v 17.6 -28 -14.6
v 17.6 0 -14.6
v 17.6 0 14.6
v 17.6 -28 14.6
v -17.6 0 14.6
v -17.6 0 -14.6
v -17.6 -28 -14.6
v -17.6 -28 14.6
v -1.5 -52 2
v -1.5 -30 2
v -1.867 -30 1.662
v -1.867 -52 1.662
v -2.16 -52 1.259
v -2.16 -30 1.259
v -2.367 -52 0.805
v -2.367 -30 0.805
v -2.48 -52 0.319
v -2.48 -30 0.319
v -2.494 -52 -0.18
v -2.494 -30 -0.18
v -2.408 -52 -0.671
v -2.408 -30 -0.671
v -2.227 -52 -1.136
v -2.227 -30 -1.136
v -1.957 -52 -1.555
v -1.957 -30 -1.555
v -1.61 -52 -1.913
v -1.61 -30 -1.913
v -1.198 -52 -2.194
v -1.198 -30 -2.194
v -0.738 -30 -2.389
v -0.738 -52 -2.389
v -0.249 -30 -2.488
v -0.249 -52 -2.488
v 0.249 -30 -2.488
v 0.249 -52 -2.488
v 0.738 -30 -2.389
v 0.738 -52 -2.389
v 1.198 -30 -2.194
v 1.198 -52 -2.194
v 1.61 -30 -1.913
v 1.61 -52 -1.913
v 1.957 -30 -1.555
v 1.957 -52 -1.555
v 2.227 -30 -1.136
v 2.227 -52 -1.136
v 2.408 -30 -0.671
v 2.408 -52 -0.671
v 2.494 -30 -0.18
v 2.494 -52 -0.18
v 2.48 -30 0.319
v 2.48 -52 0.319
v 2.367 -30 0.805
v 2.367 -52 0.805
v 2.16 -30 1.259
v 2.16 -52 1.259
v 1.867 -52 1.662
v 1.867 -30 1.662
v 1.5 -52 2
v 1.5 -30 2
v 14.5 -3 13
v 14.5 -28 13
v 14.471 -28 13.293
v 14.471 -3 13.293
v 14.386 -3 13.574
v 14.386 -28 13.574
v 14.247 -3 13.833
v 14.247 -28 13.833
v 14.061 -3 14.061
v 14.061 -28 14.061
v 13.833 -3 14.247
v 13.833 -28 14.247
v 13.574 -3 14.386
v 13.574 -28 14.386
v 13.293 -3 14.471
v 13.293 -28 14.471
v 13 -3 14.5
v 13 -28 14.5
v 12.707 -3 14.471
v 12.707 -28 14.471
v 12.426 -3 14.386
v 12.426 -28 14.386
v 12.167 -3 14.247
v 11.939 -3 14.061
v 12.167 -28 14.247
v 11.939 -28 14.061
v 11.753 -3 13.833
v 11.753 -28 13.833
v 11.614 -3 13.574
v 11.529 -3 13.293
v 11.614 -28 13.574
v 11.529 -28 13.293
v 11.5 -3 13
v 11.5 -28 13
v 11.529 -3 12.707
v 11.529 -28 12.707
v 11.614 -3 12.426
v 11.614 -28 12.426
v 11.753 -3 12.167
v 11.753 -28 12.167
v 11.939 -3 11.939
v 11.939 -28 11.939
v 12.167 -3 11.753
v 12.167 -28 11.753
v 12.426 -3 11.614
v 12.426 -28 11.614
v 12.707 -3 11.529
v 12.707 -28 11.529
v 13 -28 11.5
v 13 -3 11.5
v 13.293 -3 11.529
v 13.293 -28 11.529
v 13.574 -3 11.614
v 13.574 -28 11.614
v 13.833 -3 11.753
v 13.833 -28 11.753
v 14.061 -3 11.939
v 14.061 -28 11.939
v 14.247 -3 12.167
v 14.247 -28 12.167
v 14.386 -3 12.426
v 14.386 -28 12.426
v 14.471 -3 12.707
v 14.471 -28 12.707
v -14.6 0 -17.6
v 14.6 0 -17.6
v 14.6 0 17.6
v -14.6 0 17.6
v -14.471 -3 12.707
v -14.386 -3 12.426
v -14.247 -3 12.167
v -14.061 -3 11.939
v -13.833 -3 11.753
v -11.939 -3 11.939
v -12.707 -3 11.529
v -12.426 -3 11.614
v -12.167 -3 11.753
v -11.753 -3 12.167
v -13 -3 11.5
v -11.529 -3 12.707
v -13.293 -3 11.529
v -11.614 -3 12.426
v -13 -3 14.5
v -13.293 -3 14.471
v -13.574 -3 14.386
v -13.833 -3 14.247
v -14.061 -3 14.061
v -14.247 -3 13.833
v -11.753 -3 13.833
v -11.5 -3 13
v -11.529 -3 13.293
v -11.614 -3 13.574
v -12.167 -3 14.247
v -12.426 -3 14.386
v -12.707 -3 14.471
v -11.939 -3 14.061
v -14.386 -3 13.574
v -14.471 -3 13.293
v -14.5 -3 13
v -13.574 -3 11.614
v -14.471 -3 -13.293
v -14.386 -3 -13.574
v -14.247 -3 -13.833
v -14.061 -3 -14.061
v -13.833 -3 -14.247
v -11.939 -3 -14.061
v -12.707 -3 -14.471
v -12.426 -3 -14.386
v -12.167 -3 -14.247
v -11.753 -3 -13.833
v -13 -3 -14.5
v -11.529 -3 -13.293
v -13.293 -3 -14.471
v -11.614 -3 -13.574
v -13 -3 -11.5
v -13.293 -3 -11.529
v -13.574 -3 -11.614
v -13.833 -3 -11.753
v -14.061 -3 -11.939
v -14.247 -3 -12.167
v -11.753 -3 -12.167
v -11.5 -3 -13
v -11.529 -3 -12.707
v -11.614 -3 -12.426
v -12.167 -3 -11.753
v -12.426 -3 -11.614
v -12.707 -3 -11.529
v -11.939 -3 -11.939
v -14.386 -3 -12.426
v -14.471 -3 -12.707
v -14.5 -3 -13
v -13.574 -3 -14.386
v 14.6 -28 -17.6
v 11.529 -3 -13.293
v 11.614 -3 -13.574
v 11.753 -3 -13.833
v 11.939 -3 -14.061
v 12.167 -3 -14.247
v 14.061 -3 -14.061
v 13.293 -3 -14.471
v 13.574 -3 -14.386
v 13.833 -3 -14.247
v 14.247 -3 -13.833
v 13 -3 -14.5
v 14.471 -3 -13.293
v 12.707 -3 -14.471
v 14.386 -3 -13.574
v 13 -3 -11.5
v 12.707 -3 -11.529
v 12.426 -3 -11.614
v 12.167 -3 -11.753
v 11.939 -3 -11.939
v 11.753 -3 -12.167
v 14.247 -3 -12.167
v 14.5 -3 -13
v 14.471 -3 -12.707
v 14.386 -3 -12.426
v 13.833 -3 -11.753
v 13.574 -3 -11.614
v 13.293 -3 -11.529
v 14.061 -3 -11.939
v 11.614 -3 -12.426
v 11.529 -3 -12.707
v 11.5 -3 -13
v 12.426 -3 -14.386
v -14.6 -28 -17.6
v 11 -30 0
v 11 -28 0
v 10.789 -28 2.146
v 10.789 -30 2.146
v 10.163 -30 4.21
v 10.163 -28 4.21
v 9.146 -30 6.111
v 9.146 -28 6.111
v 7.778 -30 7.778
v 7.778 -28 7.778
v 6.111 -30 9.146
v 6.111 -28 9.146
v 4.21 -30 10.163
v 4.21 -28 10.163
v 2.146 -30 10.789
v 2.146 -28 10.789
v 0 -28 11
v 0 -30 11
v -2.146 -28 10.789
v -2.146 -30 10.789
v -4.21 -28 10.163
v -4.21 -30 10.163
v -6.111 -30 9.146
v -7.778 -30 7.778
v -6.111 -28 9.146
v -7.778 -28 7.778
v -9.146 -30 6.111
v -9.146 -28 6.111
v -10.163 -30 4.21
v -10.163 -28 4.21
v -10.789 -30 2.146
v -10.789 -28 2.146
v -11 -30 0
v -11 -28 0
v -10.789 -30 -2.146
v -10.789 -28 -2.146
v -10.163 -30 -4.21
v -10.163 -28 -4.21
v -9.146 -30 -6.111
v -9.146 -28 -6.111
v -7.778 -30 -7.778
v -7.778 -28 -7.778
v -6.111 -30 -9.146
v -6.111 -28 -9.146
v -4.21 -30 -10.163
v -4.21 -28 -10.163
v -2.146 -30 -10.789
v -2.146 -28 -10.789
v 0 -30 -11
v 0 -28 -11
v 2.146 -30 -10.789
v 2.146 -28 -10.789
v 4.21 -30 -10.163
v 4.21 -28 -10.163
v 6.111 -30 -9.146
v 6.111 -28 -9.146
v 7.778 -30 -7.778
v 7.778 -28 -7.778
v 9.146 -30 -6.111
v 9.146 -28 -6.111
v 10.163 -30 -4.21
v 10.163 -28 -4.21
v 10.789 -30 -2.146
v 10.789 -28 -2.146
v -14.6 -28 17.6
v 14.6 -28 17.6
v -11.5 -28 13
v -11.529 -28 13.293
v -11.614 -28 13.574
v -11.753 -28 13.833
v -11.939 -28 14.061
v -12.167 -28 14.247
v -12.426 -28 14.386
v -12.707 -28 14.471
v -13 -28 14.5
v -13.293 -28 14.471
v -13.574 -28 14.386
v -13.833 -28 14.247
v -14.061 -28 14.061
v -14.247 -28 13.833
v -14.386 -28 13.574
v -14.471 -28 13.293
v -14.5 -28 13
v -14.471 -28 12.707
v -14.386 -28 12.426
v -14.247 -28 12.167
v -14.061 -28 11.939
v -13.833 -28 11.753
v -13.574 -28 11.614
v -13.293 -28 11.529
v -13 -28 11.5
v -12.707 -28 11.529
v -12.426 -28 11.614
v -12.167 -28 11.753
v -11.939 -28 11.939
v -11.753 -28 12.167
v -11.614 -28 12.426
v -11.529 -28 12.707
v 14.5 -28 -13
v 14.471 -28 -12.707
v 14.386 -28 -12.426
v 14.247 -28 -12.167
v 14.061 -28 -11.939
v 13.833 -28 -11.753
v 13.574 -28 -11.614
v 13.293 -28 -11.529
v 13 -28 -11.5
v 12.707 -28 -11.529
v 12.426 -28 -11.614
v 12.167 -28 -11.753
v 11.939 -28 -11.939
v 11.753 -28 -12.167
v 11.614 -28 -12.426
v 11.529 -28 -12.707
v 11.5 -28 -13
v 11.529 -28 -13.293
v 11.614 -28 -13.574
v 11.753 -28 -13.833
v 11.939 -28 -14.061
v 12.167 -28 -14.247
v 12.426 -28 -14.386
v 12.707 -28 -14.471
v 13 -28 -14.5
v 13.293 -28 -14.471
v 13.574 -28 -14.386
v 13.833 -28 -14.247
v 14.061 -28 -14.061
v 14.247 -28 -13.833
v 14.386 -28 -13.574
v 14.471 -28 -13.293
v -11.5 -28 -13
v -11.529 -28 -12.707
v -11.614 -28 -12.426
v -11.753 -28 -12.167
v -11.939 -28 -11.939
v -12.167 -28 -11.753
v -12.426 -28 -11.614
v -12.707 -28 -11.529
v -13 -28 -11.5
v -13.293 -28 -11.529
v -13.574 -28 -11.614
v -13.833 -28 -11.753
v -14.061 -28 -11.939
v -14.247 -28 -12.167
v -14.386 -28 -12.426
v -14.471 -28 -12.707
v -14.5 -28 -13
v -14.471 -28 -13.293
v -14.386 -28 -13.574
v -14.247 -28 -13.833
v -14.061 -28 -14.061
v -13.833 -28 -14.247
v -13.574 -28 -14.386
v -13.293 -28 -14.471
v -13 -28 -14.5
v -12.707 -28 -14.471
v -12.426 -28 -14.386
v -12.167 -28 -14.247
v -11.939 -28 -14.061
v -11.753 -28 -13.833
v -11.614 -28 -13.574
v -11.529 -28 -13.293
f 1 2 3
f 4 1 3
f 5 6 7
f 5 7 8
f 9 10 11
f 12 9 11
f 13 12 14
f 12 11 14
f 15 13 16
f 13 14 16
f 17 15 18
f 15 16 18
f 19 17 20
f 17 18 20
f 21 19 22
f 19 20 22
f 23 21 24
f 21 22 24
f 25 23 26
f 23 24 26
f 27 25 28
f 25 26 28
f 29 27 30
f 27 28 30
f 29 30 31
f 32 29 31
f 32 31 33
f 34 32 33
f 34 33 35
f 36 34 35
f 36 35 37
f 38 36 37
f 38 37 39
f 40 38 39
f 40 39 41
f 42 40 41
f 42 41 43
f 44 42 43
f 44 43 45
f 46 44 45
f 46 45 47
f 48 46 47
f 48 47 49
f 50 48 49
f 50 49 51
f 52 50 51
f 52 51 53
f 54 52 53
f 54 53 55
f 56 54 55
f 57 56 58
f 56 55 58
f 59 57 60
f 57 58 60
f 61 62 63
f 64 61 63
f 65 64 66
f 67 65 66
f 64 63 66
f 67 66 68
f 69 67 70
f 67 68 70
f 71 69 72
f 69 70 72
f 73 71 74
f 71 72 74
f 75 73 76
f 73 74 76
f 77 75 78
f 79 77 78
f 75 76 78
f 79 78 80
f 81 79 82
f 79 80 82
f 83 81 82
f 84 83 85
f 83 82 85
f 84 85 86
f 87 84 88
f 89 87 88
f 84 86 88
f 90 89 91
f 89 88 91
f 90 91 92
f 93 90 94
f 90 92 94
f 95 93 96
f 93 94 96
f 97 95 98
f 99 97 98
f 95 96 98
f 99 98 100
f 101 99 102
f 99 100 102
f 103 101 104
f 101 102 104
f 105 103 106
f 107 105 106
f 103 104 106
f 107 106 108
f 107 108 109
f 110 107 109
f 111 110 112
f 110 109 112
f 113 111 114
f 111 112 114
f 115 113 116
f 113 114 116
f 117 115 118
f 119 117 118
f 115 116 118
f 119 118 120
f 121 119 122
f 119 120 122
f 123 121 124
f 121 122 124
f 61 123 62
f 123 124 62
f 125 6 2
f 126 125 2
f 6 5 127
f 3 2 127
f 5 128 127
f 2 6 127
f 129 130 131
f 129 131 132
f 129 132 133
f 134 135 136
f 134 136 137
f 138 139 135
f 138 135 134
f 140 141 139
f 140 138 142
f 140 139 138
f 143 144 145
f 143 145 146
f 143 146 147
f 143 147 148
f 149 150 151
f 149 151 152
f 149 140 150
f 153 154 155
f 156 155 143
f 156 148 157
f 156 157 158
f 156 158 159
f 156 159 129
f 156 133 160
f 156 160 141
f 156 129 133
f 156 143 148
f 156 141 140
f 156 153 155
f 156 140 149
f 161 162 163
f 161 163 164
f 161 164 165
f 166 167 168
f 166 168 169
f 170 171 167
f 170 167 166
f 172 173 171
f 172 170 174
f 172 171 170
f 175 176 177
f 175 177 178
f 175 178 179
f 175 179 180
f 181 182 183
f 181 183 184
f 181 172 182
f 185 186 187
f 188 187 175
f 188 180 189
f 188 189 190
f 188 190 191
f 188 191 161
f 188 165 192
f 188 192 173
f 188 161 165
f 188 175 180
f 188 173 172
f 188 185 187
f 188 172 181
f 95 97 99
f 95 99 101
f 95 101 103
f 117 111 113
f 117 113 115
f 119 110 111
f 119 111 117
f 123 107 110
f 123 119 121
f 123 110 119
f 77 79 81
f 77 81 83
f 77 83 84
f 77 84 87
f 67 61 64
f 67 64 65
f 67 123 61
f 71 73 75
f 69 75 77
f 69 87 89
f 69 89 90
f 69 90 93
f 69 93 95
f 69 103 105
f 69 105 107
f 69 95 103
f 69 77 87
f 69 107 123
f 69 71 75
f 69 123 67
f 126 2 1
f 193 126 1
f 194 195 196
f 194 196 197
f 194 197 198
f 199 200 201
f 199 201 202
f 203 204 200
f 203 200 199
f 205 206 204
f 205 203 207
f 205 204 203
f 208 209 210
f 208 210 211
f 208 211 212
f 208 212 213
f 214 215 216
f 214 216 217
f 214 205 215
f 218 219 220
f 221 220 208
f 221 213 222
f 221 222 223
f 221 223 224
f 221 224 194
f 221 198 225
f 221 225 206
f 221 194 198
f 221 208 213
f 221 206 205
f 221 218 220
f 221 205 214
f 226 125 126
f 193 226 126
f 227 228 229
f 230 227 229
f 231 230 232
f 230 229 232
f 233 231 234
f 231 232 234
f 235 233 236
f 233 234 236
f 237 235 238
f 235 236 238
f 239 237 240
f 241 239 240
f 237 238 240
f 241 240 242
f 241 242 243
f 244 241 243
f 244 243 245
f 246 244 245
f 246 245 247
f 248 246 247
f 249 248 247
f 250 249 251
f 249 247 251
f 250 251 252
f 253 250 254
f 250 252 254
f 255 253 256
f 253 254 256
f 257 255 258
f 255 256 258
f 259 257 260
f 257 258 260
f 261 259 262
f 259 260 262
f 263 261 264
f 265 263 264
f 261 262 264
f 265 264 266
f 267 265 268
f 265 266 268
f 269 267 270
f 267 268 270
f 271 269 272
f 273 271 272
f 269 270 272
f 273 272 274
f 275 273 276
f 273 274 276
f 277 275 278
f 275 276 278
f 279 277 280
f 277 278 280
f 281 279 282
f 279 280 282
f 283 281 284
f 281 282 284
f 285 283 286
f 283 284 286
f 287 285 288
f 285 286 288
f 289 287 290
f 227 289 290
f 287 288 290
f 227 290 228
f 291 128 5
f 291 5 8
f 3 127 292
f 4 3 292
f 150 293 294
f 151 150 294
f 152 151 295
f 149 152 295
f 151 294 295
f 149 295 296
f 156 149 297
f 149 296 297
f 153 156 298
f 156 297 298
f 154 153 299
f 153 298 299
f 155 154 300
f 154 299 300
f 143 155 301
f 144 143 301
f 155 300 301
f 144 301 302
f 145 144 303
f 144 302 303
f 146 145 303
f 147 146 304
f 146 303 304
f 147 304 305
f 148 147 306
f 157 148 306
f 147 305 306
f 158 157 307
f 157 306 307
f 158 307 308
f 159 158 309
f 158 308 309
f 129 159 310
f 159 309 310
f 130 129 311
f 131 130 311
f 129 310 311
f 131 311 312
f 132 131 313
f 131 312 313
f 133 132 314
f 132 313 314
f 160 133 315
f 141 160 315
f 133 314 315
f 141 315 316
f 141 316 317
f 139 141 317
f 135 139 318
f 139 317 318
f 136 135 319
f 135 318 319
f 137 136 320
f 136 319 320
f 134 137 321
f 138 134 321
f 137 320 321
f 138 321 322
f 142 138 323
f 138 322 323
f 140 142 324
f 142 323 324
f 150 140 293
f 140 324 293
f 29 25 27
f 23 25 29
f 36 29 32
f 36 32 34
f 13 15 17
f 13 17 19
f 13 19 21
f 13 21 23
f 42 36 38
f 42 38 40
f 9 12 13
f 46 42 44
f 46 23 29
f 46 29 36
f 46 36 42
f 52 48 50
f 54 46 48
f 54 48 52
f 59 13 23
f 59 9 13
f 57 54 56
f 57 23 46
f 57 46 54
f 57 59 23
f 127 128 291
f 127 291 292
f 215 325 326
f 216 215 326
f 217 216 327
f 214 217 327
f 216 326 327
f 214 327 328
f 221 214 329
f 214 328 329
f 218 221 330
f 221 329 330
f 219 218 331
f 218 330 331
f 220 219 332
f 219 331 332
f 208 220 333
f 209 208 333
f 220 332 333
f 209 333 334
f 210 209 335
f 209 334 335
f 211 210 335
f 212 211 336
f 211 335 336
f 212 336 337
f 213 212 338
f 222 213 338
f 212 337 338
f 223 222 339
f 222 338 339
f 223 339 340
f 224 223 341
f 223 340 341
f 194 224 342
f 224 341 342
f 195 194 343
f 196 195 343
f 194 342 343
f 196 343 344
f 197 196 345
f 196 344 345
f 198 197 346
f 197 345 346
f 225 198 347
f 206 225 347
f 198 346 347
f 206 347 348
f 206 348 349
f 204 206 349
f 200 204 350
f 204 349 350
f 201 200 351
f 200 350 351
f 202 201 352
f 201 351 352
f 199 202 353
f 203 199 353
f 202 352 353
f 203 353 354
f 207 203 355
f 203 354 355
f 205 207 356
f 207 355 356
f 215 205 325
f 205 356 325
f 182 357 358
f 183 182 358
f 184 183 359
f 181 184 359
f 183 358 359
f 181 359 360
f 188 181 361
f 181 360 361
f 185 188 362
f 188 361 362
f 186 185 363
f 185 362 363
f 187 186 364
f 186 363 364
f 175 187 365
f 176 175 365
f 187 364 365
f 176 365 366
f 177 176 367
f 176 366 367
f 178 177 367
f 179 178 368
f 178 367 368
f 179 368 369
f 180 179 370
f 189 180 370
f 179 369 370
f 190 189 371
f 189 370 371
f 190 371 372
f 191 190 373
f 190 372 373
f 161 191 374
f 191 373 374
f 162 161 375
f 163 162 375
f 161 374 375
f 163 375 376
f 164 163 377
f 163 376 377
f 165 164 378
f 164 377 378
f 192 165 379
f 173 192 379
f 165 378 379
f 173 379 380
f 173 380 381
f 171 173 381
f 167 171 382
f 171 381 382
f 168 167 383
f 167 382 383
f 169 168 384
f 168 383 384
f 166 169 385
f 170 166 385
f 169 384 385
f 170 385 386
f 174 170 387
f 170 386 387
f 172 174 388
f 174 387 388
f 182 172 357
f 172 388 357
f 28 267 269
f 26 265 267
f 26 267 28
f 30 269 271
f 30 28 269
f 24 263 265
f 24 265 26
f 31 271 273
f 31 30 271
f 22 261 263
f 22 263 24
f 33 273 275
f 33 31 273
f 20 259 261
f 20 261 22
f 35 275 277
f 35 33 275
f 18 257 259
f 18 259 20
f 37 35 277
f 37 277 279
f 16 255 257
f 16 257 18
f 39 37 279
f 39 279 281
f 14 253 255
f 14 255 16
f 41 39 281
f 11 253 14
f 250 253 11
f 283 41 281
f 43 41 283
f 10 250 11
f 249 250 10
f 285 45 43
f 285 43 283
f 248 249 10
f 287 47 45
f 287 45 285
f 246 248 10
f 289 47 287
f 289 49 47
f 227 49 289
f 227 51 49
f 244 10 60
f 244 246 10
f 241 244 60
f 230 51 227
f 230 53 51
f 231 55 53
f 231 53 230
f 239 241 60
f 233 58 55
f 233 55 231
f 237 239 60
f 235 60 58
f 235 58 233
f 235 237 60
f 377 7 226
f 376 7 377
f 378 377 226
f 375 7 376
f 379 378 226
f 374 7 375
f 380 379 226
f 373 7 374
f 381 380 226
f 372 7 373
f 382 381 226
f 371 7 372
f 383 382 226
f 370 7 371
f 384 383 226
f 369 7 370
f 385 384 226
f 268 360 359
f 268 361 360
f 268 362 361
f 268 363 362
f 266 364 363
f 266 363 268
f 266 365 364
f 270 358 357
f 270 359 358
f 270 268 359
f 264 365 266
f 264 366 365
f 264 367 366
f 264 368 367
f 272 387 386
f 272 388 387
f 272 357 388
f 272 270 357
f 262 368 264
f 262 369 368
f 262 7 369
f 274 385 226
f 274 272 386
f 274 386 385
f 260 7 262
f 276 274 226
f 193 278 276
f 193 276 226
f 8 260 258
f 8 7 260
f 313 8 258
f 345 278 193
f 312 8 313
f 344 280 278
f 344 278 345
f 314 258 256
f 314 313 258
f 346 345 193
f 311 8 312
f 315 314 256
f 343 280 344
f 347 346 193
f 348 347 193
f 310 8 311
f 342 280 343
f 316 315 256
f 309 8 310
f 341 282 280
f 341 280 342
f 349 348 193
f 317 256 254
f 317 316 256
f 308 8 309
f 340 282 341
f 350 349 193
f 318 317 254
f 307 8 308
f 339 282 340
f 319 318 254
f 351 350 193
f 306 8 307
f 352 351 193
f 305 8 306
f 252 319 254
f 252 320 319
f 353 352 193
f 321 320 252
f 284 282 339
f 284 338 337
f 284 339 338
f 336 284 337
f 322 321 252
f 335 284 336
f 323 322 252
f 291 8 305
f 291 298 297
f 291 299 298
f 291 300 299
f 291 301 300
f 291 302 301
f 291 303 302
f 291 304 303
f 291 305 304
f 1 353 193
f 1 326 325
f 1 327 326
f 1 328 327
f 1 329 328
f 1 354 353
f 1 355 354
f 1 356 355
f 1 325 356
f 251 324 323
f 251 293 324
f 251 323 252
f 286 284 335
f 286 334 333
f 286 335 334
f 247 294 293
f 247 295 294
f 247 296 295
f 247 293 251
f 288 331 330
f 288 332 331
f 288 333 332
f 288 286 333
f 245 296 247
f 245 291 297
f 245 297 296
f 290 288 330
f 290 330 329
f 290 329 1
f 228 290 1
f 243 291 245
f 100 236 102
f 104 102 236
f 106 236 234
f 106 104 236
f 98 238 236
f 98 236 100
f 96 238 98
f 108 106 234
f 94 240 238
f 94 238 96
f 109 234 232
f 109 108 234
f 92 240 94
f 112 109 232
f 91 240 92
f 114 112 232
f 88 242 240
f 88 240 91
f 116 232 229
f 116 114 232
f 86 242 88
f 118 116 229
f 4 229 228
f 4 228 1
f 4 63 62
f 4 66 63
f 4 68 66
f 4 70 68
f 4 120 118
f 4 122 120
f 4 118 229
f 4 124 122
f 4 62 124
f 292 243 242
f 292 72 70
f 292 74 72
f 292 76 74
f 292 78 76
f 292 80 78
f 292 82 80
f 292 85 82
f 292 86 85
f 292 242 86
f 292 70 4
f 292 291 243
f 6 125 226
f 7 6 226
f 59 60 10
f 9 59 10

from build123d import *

# Parameters (mm, degrees)
F0_W     = 35.2
F0_H     = 35.2
F1_DEPTH = 28
F2_SIZE  = 3
F4_DEPTH = 24
F5_R     = 11
F6_DEPTH = 2
F7_R     = 1.5
F8_DEPTH = 25


with BuildPart() as f1:
    # F0 (on Front) → F1 (new body)
    with BuildSketch(Plane.XZ):
        Rectangle(F0_W, F0_H)
    extrude(amount=F1_DEPTH)

    # F2
    f2_edges = [f1.edges().sort_by_distance(p)[0] for p in [
        (-17.6, -14, 17.6),
        (-17.6, -14, -17.6),
        (17.6, -14, -17.6),
        (17.6, -14, 17.6),
    ]]
    chamfer(f2_edges, length=F2_SIZE)

    # F3 (on face) → F4 (join)
    with BuildSketch(Plane.XZ.offset(28)):
        with BuildLine():
            Line((1.5, 2), (-1.5, 2))
            ThreePointArc((-1.5, 2), (0, -2.5), (1.5, 2))
        make_face()
    extrude(amount=F4_DEPTH)

    # F5 (on face) → F6 (join)
    with BuildSketch(Plane.XZ.offset(28)):
        Circle(F5_R)
    extrude(amount=F6_DEPTH)

    # F7 (on face) → F8 (cut)
    with BuildSketch(Plane.XZ.offset(28)):
        with Locations((-13, 13)):
            Circle(F7_R)
        with Locations((13, 13)):
            Circle(F7_R)
        with Locations((13, -13)):
            Circle(F7_R)
        with Locations((-13, -13)):
            Circle(F7_R)
    extrude(amount=-F8_DEPTH, mode=Mode.SUBTRACT)


solid = f1.part
